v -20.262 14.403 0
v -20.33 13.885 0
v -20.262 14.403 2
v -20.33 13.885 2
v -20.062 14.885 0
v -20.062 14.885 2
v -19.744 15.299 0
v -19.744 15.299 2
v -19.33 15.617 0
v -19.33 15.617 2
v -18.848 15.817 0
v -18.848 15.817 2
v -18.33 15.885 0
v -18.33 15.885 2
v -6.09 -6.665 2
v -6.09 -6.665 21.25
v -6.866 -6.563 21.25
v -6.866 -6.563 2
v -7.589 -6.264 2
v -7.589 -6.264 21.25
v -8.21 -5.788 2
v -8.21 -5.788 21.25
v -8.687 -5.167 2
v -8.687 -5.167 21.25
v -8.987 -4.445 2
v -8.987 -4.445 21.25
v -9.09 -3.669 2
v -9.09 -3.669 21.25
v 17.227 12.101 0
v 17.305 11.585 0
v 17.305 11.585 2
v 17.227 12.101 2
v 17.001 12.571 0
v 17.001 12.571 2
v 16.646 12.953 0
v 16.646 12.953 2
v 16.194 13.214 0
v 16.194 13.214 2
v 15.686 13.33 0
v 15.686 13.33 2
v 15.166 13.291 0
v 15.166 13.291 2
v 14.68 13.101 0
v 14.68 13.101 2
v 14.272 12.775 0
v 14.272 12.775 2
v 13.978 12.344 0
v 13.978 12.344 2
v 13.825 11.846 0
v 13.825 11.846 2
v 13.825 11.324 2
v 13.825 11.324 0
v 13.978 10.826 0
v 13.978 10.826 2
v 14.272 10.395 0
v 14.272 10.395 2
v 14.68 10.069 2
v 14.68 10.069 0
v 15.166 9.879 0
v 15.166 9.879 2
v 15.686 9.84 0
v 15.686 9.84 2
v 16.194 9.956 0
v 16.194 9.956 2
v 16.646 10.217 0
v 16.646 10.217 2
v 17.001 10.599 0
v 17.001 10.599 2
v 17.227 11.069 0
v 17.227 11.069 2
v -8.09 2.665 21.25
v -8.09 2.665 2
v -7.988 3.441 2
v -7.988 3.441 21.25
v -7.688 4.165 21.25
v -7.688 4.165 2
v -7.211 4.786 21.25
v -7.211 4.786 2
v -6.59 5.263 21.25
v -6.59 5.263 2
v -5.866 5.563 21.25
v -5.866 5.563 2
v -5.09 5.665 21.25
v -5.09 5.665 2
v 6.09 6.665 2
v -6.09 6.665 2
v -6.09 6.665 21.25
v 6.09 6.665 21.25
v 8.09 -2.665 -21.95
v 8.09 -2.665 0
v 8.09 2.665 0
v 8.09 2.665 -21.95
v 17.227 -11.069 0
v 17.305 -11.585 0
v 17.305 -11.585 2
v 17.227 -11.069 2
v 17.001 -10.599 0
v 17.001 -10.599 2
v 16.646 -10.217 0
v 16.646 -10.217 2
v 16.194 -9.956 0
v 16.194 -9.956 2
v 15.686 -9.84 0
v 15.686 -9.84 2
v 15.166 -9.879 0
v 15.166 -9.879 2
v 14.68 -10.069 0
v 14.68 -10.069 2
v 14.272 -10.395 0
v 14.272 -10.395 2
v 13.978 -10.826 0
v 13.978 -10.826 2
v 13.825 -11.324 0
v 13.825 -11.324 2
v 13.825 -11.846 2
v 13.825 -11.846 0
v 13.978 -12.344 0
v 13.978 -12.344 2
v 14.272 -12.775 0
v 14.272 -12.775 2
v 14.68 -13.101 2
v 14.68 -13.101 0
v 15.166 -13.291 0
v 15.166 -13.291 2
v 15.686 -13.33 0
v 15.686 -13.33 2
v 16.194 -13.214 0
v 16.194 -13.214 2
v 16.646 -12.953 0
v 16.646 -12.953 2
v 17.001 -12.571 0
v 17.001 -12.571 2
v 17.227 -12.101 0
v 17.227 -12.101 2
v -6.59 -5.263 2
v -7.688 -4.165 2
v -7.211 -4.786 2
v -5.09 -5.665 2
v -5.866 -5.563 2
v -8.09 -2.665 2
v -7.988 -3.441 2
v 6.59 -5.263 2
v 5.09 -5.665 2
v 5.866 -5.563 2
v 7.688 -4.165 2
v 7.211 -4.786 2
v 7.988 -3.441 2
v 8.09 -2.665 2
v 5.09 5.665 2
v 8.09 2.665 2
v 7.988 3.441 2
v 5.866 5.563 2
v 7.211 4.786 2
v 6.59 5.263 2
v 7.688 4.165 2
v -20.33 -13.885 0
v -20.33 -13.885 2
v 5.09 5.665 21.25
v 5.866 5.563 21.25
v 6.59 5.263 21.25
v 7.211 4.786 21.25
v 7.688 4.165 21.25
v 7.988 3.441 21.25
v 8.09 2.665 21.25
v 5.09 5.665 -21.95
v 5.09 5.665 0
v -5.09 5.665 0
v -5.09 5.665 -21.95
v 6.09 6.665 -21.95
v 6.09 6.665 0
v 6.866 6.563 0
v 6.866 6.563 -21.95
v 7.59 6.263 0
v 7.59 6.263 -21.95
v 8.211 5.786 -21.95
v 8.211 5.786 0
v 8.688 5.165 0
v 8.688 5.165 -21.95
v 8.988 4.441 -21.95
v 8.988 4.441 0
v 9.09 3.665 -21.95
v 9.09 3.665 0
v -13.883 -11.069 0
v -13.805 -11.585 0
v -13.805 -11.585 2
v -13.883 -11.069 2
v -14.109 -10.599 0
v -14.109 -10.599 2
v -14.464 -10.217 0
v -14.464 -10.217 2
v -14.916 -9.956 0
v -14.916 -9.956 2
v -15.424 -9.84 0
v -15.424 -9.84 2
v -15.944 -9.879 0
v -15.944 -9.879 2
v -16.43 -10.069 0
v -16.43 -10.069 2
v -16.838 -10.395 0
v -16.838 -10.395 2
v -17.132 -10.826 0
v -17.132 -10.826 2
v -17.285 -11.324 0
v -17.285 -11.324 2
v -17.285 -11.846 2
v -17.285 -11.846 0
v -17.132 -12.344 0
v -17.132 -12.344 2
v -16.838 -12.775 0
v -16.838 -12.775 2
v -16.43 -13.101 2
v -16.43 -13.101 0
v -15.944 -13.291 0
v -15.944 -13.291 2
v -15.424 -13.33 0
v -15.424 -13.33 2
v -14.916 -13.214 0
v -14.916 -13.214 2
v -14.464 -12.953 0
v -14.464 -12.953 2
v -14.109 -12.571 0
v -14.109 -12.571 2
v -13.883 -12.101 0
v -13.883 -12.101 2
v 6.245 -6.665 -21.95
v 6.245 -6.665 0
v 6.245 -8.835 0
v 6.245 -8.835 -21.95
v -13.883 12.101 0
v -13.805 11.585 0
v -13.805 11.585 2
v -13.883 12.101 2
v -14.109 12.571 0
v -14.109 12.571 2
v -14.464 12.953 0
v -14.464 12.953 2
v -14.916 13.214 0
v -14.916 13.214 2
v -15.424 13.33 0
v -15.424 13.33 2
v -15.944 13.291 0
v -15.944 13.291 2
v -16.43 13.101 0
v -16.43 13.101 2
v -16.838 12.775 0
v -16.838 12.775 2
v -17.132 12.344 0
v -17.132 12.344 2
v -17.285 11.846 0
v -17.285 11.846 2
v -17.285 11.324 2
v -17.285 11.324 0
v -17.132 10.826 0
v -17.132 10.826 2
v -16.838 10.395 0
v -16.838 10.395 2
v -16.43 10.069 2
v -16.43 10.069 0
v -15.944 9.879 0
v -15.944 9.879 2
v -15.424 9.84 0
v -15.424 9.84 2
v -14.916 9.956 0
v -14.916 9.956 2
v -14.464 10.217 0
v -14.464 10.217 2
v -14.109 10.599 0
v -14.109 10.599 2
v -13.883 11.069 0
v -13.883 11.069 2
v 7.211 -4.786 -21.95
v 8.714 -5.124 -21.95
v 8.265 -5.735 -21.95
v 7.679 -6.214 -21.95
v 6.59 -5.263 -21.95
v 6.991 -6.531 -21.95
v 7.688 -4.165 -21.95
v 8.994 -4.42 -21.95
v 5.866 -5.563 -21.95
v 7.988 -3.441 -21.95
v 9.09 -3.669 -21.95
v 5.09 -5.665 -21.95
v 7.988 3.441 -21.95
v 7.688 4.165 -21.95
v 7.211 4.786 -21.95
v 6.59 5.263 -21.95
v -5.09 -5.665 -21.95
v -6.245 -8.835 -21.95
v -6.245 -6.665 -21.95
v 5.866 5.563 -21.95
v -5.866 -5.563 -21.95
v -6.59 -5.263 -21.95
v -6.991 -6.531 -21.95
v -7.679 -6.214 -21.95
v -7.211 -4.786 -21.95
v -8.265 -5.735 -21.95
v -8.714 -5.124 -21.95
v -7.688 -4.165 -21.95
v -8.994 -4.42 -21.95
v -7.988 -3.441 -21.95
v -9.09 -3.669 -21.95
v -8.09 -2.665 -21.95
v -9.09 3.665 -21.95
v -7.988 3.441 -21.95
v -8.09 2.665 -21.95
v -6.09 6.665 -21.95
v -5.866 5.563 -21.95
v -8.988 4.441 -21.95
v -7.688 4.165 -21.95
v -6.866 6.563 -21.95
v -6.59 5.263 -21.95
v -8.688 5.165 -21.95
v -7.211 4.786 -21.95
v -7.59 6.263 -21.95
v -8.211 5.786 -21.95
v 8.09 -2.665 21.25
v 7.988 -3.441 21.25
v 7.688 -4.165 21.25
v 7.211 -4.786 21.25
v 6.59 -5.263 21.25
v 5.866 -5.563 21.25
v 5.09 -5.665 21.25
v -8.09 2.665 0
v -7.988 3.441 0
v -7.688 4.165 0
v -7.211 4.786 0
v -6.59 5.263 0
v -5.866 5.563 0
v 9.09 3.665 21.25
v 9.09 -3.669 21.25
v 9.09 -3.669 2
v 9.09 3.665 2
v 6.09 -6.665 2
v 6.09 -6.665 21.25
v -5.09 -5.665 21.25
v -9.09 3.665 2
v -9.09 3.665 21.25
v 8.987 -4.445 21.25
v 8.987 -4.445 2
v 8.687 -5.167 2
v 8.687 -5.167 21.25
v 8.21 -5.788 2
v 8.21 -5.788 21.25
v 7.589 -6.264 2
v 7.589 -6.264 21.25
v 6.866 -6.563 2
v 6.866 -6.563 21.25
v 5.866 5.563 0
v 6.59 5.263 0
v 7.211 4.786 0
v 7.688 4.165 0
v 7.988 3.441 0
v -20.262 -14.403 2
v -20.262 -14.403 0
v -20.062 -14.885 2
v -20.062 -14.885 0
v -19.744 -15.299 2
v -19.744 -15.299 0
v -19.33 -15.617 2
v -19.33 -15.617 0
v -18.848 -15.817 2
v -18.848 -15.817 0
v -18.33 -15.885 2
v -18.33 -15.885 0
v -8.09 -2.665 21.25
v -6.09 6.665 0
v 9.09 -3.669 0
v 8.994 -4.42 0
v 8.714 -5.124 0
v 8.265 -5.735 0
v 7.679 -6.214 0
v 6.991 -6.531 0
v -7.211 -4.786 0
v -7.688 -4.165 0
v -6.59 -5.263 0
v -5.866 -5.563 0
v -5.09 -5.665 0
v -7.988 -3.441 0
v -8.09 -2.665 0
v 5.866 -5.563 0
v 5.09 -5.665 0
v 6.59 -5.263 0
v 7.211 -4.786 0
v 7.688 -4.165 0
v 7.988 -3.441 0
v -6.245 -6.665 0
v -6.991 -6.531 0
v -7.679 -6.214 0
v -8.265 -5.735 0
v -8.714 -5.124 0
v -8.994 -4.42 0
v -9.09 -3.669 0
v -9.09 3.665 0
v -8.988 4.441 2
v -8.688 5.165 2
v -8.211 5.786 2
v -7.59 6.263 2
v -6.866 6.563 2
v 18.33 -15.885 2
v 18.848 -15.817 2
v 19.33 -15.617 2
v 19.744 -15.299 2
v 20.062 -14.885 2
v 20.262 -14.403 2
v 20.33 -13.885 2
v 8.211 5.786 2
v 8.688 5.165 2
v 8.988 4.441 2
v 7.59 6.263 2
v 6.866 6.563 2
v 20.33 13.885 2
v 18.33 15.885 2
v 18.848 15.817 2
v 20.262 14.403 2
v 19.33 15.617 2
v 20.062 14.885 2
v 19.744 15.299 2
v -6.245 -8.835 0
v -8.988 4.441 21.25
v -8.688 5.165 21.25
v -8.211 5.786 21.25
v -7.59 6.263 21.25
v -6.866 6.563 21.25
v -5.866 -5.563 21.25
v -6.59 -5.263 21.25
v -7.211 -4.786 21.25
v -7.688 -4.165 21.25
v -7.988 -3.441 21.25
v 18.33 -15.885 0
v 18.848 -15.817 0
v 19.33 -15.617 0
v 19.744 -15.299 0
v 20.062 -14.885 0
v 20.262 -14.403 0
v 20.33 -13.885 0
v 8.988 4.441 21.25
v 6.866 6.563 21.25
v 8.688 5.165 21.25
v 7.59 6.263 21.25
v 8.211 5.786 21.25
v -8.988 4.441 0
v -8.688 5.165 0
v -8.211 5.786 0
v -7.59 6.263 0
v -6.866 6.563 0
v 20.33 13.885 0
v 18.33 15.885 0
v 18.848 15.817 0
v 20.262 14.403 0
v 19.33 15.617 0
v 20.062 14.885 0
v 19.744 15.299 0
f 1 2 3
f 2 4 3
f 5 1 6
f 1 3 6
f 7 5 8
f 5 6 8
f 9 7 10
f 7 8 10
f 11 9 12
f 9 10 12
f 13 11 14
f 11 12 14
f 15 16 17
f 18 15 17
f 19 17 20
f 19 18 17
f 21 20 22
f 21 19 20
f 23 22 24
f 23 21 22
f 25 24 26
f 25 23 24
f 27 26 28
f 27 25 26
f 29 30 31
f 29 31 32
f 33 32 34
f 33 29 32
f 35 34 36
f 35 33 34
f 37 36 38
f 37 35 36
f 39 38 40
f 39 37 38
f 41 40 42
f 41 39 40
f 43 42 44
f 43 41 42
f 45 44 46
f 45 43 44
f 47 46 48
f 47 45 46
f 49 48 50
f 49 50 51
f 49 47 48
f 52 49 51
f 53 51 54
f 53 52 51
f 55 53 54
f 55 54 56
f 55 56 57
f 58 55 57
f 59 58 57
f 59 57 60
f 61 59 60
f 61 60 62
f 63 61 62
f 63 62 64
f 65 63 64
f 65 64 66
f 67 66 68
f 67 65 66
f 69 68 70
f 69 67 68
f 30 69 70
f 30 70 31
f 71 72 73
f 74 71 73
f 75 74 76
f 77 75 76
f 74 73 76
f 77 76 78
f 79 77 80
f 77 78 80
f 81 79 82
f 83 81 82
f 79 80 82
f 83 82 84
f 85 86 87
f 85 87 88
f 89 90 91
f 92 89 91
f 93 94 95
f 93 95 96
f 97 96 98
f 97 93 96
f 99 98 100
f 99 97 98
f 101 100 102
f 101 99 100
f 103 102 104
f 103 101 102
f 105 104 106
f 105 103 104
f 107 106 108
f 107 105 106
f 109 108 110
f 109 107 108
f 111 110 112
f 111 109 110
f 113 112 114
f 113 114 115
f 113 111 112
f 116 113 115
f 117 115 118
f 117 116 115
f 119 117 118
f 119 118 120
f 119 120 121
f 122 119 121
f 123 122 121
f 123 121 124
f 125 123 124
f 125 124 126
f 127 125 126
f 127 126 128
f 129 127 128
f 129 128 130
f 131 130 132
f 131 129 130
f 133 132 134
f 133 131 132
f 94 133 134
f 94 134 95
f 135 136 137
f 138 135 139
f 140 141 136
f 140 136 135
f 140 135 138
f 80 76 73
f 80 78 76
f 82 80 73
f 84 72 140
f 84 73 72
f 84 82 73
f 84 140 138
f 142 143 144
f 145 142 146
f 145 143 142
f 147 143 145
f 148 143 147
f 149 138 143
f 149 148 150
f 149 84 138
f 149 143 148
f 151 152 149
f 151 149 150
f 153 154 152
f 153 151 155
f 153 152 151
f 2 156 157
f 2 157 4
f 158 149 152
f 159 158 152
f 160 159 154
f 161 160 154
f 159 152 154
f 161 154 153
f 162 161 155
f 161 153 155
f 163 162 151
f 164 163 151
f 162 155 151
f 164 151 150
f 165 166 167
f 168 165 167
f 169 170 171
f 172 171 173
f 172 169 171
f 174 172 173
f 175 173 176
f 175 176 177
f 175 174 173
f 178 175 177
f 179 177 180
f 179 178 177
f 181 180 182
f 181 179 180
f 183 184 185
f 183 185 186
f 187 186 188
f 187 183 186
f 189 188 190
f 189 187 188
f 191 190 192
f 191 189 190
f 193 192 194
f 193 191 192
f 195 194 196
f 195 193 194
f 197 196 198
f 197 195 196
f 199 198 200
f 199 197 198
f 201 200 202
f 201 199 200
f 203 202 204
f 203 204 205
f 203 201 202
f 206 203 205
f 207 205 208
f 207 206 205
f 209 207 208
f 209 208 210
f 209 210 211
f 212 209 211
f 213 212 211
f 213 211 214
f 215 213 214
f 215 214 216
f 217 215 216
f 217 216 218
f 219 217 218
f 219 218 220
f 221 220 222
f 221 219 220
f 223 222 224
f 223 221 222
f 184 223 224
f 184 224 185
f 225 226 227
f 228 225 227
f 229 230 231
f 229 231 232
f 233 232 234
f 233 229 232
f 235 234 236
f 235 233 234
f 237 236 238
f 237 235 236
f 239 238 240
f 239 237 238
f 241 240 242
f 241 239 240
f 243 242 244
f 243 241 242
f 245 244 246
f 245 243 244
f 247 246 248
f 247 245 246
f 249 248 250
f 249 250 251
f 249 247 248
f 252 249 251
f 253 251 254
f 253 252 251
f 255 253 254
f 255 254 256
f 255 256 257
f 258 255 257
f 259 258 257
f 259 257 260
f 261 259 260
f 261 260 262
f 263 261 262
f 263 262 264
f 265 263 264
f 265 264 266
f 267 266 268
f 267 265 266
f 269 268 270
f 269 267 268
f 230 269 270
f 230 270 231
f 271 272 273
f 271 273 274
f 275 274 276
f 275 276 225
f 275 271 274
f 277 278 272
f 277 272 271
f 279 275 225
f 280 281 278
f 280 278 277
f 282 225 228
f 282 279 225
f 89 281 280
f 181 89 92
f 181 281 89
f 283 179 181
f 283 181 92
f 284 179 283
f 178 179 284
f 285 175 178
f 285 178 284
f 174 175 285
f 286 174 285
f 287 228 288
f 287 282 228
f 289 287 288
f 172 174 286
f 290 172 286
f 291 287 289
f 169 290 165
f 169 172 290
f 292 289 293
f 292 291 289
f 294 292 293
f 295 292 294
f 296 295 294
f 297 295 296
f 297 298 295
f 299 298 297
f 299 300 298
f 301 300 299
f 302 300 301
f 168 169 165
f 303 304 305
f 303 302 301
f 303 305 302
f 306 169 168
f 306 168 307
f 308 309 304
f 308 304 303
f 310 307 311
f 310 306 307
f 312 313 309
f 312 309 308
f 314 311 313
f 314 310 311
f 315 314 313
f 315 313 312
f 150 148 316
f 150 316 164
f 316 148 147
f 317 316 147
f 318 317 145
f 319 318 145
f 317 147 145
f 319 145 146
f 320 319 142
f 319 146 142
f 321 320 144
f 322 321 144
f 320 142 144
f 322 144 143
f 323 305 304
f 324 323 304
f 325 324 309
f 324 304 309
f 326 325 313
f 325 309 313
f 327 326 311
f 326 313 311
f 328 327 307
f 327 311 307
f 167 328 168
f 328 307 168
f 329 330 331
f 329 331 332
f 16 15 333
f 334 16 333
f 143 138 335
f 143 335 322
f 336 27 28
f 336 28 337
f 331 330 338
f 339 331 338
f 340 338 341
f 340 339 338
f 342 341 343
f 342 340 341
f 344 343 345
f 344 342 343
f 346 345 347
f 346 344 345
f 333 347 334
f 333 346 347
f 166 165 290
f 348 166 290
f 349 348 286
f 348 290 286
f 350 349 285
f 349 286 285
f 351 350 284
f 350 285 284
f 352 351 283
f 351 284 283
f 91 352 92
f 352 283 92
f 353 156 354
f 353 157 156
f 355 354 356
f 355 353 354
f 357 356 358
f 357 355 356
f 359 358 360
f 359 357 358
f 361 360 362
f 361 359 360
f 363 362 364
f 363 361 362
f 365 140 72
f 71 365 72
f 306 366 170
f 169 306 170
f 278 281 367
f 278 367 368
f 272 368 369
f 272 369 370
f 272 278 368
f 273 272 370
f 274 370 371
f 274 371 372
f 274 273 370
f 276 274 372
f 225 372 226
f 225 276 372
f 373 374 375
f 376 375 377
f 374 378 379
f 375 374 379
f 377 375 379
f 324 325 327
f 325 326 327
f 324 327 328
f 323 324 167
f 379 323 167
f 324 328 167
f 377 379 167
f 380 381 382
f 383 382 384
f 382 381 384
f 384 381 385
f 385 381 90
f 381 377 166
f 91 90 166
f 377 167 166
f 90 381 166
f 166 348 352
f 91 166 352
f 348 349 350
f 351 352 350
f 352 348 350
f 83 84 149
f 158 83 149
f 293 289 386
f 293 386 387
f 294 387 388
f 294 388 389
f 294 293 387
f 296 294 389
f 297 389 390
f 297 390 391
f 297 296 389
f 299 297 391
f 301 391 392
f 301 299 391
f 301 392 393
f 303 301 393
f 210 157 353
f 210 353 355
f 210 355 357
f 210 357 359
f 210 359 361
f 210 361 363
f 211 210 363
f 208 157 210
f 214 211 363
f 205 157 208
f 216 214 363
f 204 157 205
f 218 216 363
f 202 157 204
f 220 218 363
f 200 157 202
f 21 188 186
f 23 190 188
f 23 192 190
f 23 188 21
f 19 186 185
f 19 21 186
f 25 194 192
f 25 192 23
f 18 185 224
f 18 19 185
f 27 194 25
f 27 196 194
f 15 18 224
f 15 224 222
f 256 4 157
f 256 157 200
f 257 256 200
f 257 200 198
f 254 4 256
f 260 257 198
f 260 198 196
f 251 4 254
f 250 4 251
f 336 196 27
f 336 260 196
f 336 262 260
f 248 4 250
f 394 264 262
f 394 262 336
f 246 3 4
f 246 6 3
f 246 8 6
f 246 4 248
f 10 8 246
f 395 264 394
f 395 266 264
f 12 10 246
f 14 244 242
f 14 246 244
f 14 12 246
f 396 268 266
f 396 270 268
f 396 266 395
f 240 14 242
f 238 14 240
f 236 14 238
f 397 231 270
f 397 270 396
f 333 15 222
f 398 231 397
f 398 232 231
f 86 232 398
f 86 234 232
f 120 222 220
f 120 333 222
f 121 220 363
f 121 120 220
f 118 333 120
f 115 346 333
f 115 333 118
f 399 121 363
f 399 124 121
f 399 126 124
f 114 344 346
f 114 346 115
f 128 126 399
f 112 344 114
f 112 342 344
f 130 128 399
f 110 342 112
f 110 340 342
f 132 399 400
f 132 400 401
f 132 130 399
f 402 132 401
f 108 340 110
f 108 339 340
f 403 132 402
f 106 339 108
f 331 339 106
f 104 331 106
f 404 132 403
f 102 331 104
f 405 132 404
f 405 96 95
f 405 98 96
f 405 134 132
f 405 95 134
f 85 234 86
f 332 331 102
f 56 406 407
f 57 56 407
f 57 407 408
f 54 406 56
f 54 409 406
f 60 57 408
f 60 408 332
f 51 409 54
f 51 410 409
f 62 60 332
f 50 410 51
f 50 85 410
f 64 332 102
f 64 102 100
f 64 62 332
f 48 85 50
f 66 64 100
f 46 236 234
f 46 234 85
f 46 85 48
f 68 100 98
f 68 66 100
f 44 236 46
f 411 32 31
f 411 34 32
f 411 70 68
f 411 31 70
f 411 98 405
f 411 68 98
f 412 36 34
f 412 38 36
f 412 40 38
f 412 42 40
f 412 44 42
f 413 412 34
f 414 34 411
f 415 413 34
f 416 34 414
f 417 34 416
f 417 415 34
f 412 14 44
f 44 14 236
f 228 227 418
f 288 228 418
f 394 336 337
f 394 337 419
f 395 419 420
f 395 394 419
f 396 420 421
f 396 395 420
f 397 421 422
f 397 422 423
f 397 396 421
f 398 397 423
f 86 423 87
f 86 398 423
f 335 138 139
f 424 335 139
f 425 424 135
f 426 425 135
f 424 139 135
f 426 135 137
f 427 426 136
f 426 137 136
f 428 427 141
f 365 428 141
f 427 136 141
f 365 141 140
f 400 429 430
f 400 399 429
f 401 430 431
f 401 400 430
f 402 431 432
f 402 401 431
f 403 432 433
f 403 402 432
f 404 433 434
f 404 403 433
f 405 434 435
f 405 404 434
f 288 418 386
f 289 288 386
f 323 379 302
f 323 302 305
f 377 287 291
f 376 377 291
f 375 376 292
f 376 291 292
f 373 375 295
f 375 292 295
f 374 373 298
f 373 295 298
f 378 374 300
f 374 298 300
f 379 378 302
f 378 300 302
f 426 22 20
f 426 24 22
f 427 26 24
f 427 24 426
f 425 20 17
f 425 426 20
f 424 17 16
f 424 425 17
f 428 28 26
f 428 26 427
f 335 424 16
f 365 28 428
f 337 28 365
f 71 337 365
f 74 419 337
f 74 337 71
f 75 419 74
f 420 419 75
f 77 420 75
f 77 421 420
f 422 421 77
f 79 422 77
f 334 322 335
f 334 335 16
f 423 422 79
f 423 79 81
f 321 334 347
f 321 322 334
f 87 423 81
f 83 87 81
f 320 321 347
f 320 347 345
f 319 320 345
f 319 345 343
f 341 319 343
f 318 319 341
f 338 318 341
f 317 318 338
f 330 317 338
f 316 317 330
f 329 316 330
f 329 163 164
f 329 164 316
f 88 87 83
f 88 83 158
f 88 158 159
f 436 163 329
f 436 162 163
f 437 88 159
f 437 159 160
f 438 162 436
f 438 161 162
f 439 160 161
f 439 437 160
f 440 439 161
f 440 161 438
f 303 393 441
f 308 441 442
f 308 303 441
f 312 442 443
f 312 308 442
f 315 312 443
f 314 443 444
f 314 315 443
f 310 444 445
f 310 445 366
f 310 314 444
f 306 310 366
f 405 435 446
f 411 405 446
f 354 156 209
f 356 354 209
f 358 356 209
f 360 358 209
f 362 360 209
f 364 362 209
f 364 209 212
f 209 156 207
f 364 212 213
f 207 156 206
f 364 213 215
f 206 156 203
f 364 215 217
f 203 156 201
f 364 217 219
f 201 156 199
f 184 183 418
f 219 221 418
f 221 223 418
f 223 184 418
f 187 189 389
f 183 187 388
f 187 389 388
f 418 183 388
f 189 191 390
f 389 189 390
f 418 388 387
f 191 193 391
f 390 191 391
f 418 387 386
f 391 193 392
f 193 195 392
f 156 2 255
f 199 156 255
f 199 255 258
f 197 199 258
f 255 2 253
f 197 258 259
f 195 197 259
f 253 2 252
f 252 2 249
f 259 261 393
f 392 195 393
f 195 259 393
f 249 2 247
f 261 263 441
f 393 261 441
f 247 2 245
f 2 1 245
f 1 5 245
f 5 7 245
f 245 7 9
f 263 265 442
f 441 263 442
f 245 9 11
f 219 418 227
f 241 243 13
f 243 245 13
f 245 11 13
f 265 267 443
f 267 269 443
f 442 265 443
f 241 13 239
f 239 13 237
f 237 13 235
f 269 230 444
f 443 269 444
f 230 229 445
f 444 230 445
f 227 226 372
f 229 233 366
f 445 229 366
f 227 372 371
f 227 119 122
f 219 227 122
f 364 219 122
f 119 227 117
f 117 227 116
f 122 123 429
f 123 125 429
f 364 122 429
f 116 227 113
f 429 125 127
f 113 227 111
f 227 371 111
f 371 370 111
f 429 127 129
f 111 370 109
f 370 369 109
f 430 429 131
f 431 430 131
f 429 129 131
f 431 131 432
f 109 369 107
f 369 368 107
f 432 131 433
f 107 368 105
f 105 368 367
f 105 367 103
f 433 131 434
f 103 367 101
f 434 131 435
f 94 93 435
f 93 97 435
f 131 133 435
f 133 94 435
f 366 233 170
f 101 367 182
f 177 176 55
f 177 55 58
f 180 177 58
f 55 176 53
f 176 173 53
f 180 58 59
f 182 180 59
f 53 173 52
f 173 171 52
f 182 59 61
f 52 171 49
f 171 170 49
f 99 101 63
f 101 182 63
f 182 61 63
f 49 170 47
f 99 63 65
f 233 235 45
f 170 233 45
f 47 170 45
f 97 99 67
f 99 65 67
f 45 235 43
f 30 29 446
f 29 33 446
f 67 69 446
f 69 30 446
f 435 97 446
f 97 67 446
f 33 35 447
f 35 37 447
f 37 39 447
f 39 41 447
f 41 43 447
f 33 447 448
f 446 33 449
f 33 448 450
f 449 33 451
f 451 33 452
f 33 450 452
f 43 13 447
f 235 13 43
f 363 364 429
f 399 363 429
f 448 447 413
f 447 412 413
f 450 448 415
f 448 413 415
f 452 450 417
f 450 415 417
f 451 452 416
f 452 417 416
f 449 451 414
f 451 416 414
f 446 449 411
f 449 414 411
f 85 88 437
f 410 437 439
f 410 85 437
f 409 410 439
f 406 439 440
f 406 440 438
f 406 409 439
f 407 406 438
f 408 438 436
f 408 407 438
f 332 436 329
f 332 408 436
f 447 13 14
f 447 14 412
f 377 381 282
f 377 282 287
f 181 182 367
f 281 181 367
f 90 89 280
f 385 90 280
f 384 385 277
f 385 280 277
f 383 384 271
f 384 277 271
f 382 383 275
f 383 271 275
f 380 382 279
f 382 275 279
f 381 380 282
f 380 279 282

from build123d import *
from OCP.BRepAlgoAPI import BRepAlgoAPI_Cut
from OCP.TopTools import TopTools_ListOfShape

# Parameters (mm, degrees)
SKETCH1_W           = 40.66
SKETCH1_H           = 31.77
SKETCH1_R           = 1.75
BOSS_EXTRUDE1_DEPTH = 2
SKETCH2_W           = 16.18
SKETCH2_H           = 11.33
BOSS_EXTRUDE2_DEPTH = 21.95
SKETCH3_W           = 18.18
SKETCH3_H           = 13.33
SKETCH3_W_2         = 16.18
SKETCH3_H_2         = 11.33
BOSS_EXTRUDE3_DEPTH = 19.25
FILLET2_START       = -21.95
FILLET2_DEPTH       = 21.95
FILLET2_START_2     = 2
FILLET2_2_DEPTH     = 19.25
FILLET2_3_DEPTH     = 43.2
FILLET3_R           = 2


with BuildPart() as part:
    # Sketch1 → Boss-Extrude1 (new body)
    with BuildSketch(Plane.XY):
        Rectangle(SKETCH1_W, SKETCH1_H)
        with Locations((-15.555, 11.585)):
            Circle(SKETCH1_R, mode=Mode.SUBTRACT)
        with Locations((-15.555, -11.585)):
            Circle(SKETCH1_R, mode=Mode.SUBTRACT)
        with Locations((15.555, -11.585)):
            Circle(SKETCH1_R, mode=Mode.SUBTRACT)
        with Locations((15.555, 11.585)):
            Circle(SKETCH1_R, mode=Mode.SUBTRACT)
    extrude(amount=BOSS_EXTRUDE1_DEPTH)

    # Sketch2 → Boss-Extrude2 (add)
    with BuildSketch(Plane(origin=(0, 0, 0), x_dir=(-1, 0, 0), z_dir=(0, 0, -1))):
        Polygon((6.245, -6.665), (9.09, -6.665), (9.09, 6.665), (-9.09, 6.665), (-9.09, -6.665), (-6.245, -6.665), (-6.245, -8.835), (6.245, -8.835), align=None)
        Rectangle(SKETCH2_W, SKETCH2_H, mode=Mode.SUBTRACT)
    extrude(amount=BOSS_EXTRUDE2_DEPTH)

    # Sketch3 → Boss-Extrude3 (add)
    with BuildSketch(Plane.XY.offset(2)):
        Rectangle(SKETCH3_W, SKETCH3_H)
        Rectangle(SKETCH3_W_2, SKETCH3_H_2, mode=Mode.SUBTRACT)
    extrude(amount=BOSS_EXTRUDE3_DEPTH)


with BuildPart() as fillet2_tool:
    # Fillet2: read off the stored shape, not the designer's step
    # Fillet2 outline → Fillet2 (new body)
    with BuildSketch(Plane.XY.offset(FILLET2_START)):
        with BuildLine():
            Line((-9.09, -6.665), (-6.245, -6.665))
            ThreePointArc((-6.245, -6.665), (-8.265430992, -5.734799668), (-9.09, -3.669006842))
            Line((-9.09, -3.669006842), (-9.09, -6.665))
        make_face()
        with BuildLine():
            Line((-9.09, 6.665), (-9.09, 3.665))
            ThreePointArc((-9.09, 3.665), (-8.211320344, 5.786320344), (-6.09, 6.665))
            Line((-6.09, 6.665), (-9.09, 6.665))
        make_face()
        with BuildLine():
            Line((9.09, -6.665), (9.09, -3.669006842))
            ThreePointArc((9.09, -3.669006842), (8.265430992, -5.734799668), (6.245, -6.665))
            Line((6.245, -6.665), (9.09, -6.665))
        make_face()
        with BuildLine():
            Line((9.09, 6.665), (6.09, 6.665))
            ThreePointArc((6.09, 6.665), (8.211320344, 5.786320344), (9.09, 3.665))
            Line((9.09, 3.665), (9.09, 6.665))
        make_face()
    extrude(amount=FILLET2_DEPTH)


with BuildPart() as part_1:
    add(part.part)

    # Fillet2: cut by fillet2_tool, with a tolerance
    fillet2_stock = TopTools_ListOfShape()
    fillet2_stock.Append(part_1.part.wrapped)
    fillet2_tools = TopTools_ListOfShape()
    fillet2_tools.Append(fillet2_tool.part.wrapped)
    fillet2_cut = BRepAlgoAPI_Cut()
    fillet2_cut.SetArguments(fillet2_stock)
    fillet2_cut.SetTools(fillet2_tools)
    fillet2_cut.SetFuzzyValue(0.00001)
    fillet2_cut.Build()
    add(Compound.cast(fillet2_cut.Shape()).solids(), mode=Mode.REPLACE)


with BuildPart() as fillet2_2_tool:
    # Fillet2 2 outline → Fillet2 2 (new body)
    with BuildSketch(Plane.XY.offset(FILLET2_START_2)):
        with BuildLine():
            Line((-9.09, -6.665), (-6.09, -6.665))
            ThreePointArc((-6.09, -6.665), (-8.209903239, -5.787736503), (-9.089997324, -3.669006838))
            Line((-9.089997324, -3.669006838), (-9.09, -6.665))
        make_face()
        with BuildLine():
            ThreePointArc((9.089997324, -3.669006838), (8.209903239, -5.787736503), (6.09, -6.665))
            Line((6.09, -6.665), (9.09, -6.665))
            Line((9.09, -6.665), (9.089997324, -3.669006838))
        make_face()
        with BuildLine():
            Line((-9.09, 6.665), (-9.09, 3.665))
            ThreePointArc((-9.09, 3.665), (-8.211320344, 5.786320344), (-6.09, 6.665))
            Line((-6.09, 6.665), (-9.09, 6.665))
        make_face()
        with BuildLine():
            Line((9.09, 6.665), (6.09, 6.665))
            ThreePointArc((6.09, 6.665), (8.211320344, 5.786320344), (9.09, 3.665))
            Line((9.09, 3.665), (9.09, 6.665))
        make_face()
    extrude(amount=FILLET2_2_DEPTH)


with BuildPart() as part_2:
    add(part_1.part)

    # Fillet2 2: cut by fillet2_2_tool, with a tolerance
    fillet2_2_stock = TopTools_ListOfShape()
    fillet2_2_stock.Append(part_2.part.wrapped)
    fillet2_2_tools = TopTools_ListOfShape()
    fillet2_2_tools.Append(fillet2_2_tool.part.wrapped)
    fillet2_2_cut = BRepAlgoAPI_Cut()
    fillet2_2_cut.SetArguments(fillet2_2_stock)
    fillet2_2_cut.SetTools(fillet2_2_tools)
    fillet2_2_cut.SetFuzzyValue(0.00001)
    fillet2_2_cut.Build()
    add(Compound.cast(fillet2_2_cut.Shape()).solids(), mode=Mode.REPLACE)


with BuildPart() as fillet2_3_tool:
    # Fillet2 3 outline → Fillet2 3 (new body)
    with BuildSketch(Plane.XY.offset(FILLET2_START)):
        with BuildLine():
            Line((-8.09, -5.665), (-5.09, -5.665))
            ThreePointArc((-5.09, -5.665), (-7.211320344, -4.786320344), (-8.09, -2.665))
            Line((-8.09, -2.665), (-8.09, -5.665))
        make_face()
        with BuildLine():
            ThreePointArc((8.09, -2.665), (7.211320344, -4.786320344), (5.09, -5.665))
            Line((5.09, -5.665), (8.09, -5.665))
            Line((8.09, -5.665), (8.09, -2.665))
        make_face()
        with BuildLine():
            Line((-8.09, 5.665), (-8.09, 2.665))
            ThreePointArc((-8.09, 2.665), (-7.211320344, 4.786320344), (-5.09, 5.665))
            Line((-5.09, 5.665), (-8.09, 5.665))
        make_face()
        with BuildLine():
            ThreePointArc((5.09, 5.665), (7.211320344, 4.786320344), (8.09, 2.665))
            Line((8.09, 2.665), (8.09, 5.665))
            Line((8.09, 5.665), (5.09, 5.665))
        make_face()
    extrude(amount=FILLET2_3_DEPTH)


with BuildPart() as part_3:
    add(part_2.part)


with BuildPart() as part_4:
    # Fillet2 3: joined with fillet2_3_tool
    add(part_3.part.fuse(fillet2_3_tool.part, tol=0.00001))

    # Fillet3
    fillet3_edges = [part_4.edges().sort_by_distance(p)[0] for p in [
        (-20.33, 15.885, 1),
        (20.33, 15.885, 1),
        (20.33, -15.885, 1),
        (-20.33, -15.885, 1),
    ]]
    fillet(fillet3_edges, radius=FILLET3_R)


solid = part_4.part
